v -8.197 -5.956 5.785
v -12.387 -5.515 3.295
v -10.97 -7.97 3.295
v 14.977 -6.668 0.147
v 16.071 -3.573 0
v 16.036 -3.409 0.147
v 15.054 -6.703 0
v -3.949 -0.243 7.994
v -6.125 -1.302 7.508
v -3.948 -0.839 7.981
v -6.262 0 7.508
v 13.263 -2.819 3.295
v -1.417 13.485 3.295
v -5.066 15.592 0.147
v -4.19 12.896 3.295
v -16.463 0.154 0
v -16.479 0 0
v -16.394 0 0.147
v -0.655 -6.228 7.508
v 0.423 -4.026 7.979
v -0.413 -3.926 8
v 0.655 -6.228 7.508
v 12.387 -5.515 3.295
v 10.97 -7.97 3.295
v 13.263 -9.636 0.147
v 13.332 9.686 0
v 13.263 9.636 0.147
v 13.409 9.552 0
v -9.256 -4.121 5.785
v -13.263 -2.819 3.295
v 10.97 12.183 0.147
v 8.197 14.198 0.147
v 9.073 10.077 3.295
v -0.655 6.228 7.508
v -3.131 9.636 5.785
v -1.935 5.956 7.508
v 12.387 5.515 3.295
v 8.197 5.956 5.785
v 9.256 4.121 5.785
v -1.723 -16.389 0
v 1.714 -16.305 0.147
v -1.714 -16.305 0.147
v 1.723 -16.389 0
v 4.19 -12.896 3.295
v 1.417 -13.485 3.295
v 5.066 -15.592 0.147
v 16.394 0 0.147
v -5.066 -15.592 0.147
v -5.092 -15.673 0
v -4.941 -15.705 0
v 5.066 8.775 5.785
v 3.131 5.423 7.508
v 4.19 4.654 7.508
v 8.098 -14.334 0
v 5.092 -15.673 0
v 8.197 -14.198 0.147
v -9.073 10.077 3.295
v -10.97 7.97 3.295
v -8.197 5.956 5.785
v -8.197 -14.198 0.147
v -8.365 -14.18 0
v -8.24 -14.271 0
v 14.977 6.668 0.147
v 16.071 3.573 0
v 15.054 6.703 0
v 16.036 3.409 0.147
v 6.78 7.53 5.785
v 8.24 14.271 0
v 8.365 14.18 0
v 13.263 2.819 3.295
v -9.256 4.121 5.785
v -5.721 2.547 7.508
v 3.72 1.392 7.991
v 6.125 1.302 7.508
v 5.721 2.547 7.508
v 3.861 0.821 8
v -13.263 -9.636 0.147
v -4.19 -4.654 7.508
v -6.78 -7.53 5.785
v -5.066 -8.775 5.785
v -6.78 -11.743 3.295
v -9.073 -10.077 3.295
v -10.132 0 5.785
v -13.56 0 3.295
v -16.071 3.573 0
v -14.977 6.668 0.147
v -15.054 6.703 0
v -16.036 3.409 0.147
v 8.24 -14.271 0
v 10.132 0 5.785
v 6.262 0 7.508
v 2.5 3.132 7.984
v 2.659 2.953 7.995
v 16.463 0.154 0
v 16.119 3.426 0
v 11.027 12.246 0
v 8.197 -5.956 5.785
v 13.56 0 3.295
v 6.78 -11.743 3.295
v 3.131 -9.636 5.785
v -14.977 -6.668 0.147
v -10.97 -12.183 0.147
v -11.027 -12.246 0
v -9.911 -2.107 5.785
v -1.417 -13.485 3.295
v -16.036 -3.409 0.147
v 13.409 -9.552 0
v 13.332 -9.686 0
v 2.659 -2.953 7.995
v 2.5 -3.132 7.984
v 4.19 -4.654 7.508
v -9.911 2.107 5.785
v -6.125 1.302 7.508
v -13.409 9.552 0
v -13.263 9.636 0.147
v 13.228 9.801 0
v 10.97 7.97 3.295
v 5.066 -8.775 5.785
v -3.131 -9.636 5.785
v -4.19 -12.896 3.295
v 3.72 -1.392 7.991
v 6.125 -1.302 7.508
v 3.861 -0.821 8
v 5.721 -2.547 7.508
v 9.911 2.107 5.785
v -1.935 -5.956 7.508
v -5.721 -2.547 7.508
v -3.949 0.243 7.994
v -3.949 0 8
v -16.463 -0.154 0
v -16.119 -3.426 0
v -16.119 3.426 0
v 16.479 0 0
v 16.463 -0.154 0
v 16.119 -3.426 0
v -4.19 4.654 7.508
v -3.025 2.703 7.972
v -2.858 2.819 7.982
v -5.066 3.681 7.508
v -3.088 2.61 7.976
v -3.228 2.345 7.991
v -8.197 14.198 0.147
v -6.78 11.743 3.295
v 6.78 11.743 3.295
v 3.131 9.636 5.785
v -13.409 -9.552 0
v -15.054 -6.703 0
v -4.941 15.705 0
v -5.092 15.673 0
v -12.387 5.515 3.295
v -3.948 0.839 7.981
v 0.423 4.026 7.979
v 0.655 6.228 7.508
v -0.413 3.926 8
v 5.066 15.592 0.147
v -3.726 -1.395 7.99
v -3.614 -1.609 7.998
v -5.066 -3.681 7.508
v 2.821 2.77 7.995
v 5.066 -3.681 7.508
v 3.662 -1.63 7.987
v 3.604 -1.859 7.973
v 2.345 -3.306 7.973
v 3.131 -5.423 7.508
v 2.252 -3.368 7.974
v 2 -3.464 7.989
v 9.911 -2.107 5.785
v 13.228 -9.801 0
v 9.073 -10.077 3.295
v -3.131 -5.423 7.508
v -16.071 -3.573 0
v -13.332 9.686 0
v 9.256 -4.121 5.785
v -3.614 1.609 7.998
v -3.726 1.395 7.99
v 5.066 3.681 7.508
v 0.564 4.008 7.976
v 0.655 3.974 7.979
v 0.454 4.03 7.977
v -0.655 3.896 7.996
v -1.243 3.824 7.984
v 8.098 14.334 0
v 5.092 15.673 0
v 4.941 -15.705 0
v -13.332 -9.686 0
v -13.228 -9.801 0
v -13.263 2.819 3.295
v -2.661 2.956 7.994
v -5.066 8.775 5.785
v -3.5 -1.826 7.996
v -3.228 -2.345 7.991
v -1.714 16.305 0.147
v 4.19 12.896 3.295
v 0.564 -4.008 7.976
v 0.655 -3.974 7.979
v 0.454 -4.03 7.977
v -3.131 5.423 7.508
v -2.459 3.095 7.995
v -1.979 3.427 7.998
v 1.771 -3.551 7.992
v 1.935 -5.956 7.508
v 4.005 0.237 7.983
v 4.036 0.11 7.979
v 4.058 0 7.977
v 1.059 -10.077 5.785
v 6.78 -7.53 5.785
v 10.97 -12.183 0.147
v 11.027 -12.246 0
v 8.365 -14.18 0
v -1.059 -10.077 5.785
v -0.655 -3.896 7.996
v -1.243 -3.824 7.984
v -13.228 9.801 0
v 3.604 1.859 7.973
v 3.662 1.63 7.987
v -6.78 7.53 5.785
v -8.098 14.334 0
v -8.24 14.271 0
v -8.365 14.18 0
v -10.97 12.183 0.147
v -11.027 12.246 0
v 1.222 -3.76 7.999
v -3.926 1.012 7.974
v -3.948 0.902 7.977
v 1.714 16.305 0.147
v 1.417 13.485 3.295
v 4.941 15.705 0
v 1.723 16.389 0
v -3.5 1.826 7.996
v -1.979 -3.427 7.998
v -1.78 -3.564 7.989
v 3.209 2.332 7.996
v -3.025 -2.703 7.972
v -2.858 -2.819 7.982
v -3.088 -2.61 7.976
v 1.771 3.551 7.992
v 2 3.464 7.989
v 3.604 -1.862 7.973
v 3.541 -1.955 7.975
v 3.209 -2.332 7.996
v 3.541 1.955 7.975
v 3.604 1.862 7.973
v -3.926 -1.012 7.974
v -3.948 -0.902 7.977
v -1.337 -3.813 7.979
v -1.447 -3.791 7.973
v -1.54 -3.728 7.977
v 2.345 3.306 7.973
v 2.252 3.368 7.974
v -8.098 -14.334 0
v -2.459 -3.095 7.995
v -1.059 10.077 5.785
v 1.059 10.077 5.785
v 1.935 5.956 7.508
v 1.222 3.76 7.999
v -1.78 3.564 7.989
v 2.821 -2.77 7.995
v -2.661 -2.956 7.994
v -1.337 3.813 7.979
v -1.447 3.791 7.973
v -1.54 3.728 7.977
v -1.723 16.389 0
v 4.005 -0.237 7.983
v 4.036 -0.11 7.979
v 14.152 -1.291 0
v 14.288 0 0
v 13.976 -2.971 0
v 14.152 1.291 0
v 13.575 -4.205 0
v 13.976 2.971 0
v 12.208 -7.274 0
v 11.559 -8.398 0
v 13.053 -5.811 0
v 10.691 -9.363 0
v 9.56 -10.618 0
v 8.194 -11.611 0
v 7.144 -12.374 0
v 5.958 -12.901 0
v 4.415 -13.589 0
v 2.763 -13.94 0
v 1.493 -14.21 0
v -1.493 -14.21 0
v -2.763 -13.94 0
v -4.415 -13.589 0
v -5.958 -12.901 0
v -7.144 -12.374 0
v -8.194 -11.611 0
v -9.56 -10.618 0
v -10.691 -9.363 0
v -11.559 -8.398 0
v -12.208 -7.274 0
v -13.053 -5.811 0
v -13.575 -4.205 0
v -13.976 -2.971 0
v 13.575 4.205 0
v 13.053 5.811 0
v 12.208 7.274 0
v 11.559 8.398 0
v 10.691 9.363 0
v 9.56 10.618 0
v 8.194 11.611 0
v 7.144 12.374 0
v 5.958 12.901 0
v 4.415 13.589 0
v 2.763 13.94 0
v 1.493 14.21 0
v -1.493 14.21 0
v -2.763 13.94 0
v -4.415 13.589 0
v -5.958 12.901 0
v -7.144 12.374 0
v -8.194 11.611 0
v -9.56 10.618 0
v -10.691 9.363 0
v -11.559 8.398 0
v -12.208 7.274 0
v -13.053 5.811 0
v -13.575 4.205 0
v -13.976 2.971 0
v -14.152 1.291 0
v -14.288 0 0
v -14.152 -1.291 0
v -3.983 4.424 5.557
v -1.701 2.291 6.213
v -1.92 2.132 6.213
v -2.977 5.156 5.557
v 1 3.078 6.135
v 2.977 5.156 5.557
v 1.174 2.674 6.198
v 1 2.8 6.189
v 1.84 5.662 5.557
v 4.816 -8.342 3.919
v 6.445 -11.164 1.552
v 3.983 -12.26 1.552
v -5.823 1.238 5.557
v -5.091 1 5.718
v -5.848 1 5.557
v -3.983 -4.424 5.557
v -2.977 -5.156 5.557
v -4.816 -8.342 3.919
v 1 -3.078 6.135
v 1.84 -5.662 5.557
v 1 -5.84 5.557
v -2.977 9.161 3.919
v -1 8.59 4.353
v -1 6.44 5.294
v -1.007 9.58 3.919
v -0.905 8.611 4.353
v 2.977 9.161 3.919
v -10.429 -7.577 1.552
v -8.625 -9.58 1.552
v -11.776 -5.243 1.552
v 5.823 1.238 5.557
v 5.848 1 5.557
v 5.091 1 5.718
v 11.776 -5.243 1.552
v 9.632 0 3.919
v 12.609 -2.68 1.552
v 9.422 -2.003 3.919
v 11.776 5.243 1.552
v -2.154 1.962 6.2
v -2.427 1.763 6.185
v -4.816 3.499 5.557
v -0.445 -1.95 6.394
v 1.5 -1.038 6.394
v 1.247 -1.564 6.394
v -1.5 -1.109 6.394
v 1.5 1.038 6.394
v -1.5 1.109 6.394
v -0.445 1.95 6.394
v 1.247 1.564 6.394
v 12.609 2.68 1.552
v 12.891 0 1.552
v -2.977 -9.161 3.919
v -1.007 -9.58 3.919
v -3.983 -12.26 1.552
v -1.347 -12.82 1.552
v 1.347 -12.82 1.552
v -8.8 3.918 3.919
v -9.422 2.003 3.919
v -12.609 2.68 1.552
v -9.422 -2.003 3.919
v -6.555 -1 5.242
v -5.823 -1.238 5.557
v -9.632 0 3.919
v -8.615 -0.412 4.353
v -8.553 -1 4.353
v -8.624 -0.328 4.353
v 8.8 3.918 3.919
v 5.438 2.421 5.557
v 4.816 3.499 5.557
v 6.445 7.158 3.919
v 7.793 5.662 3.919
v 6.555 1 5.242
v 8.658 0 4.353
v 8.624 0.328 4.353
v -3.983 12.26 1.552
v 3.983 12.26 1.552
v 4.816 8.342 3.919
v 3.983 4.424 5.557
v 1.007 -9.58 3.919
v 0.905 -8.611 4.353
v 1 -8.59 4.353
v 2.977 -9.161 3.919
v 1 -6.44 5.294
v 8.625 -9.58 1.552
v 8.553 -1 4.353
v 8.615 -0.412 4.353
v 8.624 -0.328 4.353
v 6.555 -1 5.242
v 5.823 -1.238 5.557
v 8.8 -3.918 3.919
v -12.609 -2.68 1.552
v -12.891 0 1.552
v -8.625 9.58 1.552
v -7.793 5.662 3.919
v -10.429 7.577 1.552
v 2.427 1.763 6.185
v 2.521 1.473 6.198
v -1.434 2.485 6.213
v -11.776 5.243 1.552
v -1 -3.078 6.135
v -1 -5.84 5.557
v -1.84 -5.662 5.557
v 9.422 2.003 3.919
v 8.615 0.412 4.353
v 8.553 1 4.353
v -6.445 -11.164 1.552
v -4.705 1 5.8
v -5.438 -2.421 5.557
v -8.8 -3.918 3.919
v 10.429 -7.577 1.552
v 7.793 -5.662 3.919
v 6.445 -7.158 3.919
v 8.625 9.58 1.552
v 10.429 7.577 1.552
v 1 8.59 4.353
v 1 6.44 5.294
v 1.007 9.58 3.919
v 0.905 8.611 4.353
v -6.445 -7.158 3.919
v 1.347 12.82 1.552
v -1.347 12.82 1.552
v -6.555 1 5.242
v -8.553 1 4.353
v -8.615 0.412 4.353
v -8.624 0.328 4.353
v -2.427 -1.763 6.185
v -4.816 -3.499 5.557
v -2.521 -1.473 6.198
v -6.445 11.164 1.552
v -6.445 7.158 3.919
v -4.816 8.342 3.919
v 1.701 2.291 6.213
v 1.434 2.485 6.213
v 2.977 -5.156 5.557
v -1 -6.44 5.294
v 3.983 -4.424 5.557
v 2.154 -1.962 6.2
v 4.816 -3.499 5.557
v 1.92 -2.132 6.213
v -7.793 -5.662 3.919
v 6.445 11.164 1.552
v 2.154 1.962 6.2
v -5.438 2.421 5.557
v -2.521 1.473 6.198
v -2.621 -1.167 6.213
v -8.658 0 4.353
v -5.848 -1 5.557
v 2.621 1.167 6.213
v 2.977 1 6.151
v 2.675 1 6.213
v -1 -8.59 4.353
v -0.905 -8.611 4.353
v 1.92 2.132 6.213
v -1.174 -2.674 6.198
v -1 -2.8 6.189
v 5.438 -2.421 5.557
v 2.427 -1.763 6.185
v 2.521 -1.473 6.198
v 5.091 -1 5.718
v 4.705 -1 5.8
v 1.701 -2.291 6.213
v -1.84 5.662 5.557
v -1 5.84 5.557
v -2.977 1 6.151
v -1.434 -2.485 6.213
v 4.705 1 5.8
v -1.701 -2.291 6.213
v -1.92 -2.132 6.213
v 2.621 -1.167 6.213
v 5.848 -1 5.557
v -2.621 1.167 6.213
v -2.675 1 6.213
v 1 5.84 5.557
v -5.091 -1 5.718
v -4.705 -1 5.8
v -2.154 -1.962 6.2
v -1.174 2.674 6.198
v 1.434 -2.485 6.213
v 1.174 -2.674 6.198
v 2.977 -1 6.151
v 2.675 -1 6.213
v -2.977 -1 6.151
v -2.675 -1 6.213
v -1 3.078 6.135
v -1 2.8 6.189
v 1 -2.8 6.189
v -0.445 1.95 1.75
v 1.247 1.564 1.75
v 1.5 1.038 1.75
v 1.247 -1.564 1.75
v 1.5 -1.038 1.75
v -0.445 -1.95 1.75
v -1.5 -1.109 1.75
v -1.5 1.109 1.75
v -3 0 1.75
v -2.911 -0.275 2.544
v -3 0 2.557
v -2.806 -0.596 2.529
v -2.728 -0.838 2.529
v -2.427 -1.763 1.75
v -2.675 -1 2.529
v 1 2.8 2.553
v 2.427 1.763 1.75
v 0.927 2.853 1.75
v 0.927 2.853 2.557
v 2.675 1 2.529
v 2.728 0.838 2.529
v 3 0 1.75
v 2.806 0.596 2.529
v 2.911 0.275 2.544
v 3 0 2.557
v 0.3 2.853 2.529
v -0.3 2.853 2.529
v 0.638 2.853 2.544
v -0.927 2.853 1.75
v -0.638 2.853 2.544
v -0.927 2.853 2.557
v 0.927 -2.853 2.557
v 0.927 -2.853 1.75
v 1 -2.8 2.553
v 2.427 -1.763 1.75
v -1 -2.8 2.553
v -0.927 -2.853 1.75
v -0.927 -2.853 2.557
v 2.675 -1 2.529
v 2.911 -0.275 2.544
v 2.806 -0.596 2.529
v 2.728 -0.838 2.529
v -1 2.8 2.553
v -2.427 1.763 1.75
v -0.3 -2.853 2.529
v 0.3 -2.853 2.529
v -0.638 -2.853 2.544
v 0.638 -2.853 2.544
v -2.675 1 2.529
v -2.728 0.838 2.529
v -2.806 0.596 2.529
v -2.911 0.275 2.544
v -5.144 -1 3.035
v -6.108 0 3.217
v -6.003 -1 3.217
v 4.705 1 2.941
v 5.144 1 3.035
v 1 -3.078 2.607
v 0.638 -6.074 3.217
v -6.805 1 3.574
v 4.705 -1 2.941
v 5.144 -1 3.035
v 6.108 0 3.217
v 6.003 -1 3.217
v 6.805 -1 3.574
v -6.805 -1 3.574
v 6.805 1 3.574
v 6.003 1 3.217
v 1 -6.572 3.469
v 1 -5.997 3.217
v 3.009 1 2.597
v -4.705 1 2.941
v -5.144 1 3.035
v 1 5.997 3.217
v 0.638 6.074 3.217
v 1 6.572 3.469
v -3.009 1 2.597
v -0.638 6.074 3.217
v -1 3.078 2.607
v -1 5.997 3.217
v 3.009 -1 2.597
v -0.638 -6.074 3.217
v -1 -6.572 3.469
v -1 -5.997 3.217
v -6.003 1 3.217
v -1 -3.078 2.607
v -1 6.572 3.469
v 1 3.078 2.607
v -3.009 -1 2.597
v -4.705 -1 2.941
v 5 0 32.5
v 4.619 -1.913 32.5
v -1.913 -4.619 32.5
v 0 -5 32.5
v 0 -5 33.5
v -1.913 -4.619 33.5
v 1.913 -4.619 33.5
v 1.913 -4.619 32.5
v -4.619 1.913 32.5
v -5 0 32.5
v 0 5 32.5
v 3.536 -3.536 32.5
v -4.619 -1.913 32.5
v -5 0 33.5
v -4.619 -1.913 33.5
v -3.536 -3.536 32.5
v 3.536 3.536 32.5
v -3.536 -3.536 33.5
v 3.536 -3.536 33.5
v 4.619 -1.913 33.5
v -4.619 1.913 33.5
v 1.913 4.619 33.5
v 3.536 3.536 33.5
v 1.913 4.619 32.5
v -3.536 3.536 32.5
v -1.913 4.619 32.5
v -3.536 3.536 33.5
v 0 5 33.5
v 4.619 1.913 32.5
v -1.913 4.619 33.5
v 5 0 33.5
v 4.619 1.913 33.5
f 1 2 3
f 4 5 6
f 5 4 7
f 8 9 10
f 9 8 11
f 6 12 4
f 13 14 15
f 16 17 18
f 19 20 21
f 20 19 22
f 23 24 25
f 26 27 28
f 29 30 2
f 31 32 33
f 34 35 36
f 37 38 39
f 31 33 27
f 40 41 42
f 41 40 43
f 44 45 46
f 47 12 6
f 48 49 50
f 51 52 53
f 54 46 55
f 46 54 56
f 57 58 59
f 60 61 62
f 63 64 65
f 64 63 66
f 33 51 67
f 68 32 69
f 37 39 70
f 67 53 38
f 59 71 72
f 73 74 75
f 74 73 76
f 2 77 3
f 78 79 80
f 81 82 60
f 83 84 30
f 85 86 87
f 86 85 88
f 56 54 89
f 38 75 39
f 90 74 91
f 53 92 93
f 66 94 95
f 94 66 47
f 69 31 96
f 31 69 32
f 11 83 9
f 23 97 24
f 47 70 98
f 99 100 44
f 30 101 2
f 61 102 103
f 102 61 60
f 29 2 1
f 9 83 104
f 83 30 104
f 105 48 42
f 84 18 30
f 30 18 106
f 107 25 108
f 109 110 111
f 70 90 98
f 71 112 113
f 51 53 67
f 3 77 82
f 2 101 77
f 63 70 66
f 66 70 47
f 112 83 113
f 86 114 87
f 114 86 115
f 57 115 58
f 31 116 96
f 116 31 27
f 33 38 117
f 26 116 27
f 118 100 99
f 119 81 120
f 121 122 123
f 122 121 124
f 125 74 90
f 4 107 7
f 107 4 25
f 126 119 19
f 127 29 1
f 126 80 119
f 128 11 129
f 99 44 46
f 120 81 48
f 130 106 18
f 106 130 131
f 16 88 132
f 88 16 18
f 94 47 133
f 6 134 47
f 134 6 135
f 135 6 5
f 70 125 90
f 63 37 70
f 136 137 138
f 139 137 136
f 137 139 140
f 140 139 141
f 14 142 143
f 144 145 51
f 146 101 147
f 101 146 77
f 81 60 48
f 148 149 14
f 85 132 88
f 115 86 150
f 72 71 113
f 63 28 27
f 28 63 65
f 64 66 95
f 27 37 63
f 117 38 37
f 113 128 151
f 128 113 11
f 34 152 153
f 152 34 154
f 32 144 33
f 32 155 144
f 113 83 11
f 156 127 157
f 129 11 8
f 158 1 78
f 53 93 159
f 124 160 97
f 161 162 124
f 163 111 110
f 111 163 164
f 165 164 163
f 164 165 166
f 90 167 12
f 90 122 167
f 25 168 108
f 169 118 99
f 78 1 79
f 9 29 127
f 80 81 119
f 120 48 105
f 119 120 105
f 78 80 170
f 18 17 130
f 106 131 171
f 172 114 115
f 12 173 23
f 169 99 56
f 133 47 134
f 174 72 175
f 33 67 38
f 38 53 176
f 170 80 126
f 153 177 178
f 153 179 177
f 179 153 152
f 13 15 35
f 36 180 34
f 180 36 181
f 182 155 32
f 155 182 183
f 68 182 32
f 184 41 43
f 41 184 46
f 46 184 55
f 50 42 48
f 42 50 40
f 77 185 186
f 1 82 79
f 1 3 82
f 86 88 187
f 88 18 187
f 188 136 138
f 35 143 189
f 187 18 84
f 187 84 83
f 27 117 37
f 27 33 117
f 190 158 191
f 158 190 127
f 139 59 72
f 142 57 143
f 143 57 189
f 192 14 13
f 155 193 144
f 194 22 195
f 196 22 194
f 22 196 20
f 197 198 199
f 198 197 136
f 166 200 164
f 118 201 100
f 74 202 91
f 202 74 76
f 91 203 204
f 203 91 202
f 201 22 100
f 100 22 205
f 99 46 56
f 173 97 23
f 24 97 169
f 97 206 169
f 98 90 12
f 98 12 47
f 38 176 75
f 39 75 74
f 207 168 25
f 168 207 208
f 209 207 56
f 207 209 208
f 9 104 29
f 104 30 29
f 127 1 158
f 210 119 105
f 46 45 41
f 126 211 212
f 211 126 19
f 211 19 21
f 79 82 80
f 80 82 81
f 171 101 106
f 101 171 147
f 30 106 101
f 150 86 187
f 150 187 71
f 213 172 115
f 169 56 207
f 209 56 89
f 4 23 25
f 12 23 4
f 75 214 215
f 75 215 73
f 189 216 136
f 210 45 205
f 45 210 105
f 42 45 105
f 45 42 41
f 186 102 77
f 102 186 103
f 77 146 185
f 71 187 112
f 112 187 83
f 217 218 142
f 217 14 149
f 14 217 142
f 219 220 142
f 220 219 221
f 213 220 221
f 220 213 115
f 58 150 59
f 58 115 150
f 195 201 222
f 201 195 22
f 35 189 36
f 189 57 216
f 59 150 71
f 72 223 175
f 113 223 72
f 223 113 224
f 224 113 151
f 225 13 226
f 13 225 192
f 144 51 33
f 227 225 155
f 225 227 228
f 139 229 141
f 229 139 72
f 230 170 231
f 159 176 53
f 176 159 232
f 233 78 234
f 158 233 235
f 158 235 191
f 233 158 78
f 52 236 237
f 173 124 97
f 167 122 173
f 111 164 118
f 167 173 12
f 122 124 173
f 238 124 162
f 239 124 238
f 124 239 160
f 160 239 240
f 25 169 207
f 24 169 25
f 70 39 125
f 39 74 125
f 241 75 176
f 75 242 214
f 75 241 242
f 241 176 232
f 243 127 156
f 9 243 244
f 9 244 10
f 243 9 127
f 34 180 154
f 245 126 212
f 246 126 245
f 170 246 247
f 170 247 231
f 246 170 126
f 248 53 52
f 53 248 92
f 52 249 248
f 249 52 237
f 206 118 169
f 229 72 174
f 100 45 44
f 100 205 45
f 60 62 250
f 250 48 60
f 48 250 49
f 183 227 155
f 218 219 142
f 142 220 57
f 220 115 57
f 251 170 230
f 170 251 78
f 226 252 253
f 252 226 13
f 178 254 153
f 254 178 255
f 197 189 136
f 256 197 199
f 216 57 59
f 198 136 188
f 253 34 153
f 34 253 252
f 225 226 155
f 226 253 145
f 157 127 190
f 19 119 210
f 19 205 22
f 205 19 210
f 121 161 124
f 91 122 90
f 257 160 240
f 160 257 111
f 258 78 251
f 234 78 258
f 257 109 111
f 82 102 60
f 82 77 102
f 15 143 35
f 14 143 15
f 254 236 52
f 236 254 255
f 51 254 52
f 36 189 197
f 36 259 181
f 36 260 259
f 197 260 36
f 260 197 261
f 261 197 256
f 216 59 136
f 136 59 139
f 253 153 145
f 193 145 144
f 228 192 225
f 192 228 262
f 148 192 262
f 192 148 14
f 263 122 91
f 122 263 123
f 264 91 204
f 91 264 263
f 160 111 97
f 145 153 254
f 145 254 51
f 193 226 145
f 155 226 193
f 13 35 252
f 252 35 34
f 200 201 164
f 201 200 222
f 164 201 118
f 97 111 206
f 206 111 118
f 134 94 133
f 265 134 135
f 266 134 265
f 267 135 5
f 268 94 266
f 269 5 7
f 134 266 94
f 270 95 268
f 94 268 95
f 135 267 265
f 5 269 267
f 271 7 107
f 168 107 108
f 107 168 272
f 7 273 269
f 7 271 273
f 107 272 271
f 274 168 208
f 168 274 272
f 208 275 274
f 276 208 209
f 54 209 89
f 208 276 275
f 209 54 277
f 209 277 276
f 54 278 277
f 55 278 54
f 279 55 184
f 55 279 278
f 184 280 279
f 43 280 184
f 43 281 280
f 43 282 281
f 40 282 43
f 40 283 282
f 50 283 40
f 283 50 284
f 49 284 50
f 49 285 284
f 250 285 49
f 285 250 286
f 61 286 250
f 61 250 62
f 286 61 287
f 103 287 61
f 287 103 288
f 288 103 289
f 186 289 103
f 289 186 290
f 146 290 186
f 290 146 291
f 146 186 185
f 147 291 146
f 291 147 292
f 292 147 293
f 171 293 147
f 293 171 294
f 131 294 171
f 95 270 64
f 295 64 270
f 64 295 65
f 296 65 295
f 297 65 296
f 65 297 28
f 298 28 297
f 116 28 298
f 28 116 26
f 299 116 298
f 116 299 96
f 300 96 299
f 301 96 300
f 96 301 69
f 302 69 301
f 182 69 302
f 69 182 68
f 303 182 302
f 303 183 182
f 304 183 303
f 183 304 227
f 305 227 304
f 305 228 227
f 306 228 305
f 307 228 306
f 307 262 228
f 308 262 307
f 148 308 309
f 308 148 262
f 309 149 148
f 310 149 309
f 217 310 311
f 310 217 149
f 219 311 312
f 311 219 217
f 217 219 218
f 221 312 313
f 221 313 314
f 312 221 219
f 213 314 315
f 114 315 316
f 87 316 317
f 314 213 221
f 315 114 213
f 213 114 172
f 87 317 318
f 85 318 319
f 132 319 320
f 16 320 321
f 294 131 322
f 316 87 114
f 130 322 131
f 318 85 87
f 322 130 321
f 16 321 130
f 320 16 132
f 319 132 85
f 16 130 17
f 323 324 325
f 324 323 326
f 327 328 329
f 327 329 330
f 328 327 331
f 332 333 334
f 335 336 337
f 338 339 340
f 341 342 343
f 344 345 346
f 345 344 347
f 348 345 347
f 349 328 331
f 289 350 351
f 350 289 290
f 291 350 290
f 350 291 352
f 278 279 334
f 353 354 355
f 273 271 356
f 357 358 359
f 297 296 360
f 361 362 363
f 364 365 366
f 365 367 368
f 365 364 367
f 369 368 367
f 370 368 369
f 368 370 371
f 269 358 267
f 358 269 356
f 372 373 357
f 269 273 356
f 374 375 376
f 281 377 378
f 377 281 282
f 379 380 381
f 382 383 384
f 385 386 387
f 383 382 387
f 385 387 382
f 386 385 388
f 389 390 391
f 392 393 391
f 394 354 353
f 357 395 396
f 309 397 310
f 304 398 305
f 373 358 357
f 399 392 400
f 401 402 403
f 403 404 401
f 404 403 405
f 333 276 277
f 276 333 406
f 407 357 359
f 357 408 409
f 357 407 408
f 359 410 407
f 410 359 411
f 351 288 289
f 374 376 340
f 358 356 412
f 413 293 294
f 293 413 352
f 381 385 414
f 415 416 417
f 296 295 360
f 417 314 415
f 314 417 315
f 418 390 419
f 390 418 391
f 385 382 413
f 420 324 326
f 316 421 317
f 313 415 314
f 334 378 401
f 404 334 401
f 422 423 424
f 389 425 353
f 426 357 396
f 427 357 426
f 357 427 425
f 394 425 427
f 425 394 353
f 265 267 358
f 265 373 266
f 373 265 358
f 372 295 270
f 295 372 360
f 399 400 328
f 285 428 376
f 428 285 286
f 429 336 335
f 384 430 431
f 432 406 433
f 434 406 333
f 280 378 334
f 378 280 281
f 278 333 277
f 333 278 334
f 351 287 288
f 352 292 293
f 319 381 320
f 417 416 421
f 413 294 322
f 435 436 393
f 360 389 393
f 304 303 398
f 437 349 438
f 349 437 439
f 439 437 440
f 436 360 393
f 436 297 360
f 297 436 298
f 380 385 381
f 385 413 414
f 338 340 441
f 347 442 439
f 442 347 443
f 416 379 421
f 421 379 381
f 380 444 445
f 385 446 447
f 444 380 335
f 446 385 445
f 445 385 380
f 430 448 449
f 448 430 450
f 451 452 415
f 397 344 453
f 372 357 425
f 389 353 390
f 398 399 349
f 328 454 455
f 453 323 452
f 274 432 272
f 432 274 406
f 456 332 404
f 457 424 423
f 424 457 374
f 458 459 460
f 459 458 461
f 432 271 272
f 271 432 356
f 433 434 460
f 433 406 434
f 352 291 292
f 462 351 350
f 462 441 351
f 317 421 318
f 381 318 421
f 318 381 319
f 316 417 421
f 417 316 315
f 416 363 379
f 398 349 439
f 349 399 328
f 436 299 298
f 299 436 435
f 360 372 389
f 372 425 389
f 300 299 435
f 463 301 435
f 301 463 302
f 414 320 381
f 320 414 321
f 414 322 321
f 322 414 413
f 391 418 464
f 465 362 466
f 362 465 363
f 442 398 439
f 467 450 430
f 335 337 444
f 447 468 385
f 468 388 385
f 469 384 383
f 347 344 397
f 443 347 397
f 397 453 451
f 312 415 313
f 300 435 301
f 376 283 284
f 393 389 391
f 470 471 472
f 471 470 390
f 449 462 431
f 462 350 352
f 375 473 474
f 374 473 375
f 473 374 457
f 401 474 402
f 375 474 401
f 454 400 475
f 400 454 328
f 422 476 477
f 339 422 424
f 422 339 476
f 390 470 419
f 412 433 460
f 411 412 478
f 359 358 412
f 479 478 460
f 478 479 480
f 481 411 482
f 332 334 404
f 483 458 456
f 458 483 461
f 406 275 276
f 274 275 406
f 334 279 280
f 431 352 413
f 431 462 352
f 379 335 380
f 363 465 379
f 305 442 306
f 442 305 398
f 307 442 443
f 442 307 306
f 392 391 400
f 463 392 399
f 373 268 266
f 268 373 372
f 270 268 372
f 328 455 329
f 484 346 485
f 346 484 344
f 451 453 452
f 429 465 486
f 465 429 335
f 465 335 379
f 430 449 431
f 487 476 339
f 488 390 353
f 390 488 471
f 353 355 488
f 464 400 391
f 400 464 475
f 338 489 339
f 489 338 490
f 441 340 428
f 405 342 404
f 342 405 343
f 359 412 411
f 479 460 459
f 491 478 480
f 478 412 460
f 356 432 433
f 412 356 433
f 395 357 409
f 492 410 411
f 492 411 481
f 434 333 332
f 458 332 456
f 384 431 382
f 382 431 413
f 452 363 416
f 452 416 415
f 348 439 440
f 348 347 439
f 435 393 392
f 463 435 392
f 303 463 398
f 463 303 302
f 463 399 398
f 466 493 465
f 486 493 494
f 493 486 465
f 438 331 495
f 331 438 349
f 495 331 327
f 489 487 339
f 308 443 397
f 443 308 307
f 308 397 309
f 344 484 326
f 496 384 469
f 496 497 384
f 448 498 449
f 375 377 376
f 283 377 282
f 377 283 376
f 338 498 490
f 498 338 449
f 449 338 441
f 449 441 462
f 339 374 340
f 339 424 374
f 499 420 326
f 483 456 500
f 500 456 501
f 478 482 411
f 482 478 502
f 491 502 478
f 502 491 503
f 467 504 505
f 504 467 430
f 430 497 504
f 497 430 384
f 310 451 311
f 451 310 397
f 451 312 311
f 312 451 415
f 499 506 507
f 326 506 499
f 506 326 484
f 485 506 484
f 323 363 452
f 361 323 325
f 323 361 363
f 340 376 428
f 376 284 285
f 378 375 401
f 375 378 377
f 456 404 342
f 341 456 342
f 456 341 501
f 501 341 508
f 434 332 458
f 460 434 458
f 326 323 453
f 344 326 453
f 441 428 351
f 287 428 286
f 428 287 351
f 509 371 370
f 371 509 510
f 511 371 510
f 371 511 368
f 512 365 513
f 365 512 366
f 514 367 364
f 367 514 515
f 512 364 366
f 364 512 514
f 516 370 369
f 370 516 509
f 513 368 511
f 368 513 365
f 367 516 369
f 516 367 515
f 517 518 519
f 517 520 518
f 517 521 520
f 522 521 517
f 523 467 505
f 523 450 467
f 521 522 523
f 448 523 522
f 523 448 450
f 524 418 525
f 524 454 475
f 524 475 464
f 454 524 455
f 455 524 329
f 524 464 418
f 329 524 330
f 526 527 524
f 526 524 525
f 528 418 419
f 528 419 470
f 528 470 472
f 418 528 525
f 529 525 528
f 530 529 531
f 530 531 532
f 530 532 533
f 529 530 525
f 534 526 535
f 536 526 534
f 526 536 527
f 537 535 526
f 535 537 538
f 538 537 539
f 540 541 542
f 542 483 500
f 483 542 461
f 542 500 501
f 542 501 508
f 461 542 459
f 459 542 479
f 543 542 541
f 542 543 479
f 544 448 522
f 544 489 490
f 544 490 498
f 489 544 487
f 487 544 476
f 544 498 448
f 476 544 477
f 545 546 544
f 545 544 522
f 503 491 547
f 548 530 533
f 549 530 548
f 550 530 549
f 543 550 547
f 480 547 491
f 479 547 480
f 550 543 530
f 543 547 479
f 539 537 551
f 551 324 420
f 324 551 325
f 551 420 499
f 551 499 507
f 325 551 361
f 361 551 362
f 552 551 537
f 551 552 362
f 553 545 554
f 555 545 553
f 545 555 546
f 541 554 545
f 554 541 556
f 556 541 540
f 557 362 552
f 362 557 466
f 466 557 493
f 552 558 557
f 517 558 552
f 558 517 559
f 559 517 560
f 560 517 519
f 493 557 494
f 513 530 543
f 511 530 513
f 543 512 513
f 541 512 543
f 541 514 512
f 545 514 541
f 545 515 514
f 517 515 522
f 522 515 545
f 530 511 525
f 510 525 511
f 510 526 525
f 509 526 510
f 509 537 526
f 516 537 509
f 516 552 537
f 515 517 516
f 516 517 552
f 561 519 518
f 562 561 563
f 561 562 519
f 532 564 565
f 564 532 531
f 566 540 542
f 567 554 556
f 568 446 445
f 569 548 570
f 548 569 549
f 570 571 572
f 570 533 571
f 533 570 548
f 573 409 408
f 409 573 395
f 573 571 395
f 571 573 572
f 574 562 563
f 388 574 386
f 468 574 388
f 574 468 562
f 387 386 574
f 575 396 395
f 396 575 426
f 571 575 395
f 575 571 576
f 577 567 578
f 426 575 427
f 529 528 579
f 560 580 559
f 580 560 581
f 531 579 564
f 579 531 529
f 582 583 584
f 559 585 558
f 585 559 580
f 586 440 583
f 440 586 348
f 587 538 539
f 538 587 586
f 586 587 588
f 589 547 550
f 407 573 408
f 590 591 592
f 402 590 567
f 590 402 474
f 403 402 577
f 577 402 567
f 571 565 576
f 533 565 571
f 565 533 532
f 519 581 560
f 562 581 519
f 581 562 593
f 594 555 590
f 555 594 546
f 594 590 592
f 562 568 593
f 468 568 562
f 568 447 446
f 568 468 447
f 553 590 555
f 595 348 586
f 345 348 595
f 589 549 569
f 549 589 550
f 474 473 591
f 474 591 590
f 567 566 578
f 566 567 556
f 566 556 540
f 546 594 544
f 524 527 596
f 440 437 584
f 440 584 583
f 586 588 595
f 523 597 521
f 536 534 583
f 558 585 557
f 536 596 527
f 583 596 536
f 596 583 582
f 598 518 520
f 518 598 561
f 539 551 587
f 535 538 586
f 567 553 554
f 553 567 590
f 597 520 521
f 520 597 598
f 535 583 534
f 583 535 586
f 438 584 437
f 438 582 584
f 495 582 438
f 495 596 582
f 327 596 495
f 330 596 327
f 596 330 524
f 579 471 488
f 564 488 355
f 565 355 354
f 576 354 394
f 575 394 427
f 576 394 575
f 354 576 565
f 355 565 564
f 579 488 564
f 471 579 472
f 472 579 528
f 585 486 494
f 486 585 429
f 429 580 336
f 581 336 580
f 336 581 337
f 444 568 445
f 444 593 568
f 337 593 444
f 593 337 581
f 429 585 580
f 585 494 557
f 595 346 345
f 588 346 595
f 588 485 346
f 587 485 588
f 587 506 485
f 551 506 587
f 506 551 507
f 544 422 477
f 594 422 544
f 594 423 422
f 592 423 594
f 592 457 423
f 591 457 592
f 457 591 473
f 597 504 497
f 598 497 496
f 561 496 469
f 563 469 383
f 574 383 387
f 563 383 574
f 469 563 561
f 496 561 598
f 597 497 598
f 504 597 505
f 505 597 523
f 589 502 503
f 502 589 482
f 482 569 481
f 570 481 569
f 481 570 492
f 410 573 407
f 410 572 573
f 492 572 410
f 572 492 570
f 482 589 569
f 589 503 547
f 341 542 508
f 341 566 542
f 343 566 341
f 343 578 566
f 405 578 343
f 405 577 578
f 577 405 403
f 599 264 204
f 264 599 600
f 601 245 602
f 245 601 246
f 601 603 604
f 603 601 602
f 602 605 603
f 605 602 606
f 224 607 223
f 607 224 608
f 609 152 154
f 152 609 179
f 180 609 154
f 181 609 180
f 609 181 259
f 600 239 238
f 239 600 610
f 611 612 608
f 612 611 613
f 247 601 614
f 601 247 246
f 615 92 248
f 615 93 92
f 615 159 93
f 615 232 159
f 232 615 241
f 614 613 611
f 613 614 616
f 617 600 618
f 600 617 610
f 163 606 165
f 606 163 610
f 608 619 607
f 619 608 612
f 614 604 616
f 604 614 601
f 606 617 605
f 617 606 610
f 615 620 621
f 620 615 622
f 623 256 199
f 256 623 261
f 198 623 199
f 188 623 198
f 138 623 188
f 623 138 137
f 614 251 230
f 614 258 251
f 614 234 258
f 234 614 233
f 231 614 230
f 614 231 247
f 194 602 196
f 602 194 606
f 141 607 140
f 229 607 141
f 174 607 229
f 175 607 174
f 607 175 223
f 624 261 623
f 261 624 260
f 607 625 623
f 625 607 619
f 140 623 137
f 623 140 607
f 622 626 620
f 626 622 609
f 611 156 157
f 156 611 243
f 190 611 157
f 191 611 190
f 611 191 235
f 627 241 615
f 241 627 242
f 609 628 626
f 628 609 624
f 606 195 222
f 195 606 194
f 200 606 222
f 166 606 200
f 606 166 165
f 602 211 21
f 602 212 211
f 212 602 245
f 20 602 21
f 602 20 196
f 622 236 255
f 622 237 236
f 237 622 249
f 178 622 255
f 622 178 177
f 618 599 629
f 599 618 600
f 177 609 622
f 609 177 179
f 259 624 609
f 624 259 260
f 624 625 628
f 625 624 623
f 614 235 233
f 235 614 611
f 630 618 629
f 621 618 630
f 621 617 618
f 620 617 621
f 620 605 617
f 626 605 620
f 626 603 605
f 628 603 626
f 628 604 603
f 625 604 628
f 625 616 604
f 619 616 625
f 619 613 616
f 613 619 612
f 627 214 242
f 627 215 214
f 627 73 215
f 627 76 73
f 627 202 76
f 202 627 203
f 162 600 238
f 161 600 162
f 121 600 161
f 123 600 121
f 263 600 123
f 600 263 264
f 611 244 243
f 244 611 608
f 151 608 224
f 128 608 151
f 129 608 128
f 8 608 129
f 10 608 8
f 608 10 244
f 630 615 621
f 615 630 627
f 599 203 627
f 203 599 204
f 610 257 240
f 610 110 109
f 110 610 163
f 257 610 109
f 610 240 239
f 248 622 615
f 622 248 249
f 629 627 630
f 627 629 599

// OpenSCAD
customStick();
/*[Top of Stick]*/
stickHeight=25;
stickDiameterBottom=8;
stickDiameterTop=10;
/*[Measurement from Controller]*/
//If remove the stick from the controller, there is a hemisphere, if you set this hemisphere flat on a piece of paper this is the radius of the circle touching the paper
radiusOfCapCrossection=10;
//This is the height of the hemisphere above the paper
heightOfCap=8.5;
wallThickness=1;
pegMinorAxis=3;
pegMajorAxis=4;
pegDepth=4.75;







/*[calculation Block]*/
radiusOfSphereForStick=(radiusOfCapCrossection*radiusOfCapCrossection+heightOfCap*heightOfCap)/heightOfCap;

module customStick(){
	union(){
		difference(){
			translate([0,0,heightOfCap-radiusOfSphereForStick])sphere(radiusOfSphereForStick);
			translate([-2*radiusOfSphereForStick,-2*radiusOfSphereForStick,-2*radiusOfSphereForStick])cube([4*radiusOfSphereForStick,4*radiusOfSphereForStick,2*radiusOfSphereForStick]);
			translate([0,0,heightOfCap-wallThickness-radiusOfSphereForStick])sphere(radiusOfSphereForStick-wallThickness);
		}
		difference(){
			translate([0,0,heightOfCap-2*wallThickness-pegDepth])cylinder(r=pegMajorAxis/2+wallThickness,h=pegDepth);
			difference(){
				
				cylinder(r=pegMajorAxis/2,h=heightOfCap-wallThickness);
				translate([pegMinorAxis/2,-pegMajorAxis/2,0])cube([pegMinorAxis,pegMajorAxis,heightOfCap]);
				rotate([0,0,180])translate([pegMinorAxis/2,-pegMajorAxis/2,0])cube([pegMinorAxis,pegMajorAxis,heightOfCap]);

			}
		}
		hull(){
			translate([0,0,stickHeight+heightOfCap-wallThickness])cylinder(r=stickDiameterTop/2,h=wallThickness);
			difference(){
				cylinder(r=stickDiameterBottom/2,h=stickHeight+heightOfCap);
				translate([0,0,heightOfCap-wallThickness-radiusOfSphereForStick])sphere(radiusOfSphereForStick-.5*wallThickness);
			}
		}
		difference(){
			intersection(){
				translate([0,0,heightOfCap-wallThickness-radiusOfSphereForStick])sphere(radiusOfSphereForStick-.5*wallThickness);
translate([0,0,heightOfCap-2*wallThickness-pegDepth+radiusOfSphereForStick])sphere(radiusOfSphereForStick-.5*wallThickness);
			}
			cylinder(r=pegMajorAxis/2,h=heightOfCap-wallThickness);
			translate([wallThickness,wallThickness,0])cube(radiusOfSphereForStick);	
			rotate([0,0,90])translate([wallThickness,wallThickness,0])cube(radiusOfSphereForStick);
			rotate([0,0,180])translate([wallThickness,wallThickness,0])cube(radiusOfSphereForStick);
			rotate([0,0,270])translate([wallThickness,wallThickness,0])cube(radiusOfSphereForStick);
		}
	}
}
